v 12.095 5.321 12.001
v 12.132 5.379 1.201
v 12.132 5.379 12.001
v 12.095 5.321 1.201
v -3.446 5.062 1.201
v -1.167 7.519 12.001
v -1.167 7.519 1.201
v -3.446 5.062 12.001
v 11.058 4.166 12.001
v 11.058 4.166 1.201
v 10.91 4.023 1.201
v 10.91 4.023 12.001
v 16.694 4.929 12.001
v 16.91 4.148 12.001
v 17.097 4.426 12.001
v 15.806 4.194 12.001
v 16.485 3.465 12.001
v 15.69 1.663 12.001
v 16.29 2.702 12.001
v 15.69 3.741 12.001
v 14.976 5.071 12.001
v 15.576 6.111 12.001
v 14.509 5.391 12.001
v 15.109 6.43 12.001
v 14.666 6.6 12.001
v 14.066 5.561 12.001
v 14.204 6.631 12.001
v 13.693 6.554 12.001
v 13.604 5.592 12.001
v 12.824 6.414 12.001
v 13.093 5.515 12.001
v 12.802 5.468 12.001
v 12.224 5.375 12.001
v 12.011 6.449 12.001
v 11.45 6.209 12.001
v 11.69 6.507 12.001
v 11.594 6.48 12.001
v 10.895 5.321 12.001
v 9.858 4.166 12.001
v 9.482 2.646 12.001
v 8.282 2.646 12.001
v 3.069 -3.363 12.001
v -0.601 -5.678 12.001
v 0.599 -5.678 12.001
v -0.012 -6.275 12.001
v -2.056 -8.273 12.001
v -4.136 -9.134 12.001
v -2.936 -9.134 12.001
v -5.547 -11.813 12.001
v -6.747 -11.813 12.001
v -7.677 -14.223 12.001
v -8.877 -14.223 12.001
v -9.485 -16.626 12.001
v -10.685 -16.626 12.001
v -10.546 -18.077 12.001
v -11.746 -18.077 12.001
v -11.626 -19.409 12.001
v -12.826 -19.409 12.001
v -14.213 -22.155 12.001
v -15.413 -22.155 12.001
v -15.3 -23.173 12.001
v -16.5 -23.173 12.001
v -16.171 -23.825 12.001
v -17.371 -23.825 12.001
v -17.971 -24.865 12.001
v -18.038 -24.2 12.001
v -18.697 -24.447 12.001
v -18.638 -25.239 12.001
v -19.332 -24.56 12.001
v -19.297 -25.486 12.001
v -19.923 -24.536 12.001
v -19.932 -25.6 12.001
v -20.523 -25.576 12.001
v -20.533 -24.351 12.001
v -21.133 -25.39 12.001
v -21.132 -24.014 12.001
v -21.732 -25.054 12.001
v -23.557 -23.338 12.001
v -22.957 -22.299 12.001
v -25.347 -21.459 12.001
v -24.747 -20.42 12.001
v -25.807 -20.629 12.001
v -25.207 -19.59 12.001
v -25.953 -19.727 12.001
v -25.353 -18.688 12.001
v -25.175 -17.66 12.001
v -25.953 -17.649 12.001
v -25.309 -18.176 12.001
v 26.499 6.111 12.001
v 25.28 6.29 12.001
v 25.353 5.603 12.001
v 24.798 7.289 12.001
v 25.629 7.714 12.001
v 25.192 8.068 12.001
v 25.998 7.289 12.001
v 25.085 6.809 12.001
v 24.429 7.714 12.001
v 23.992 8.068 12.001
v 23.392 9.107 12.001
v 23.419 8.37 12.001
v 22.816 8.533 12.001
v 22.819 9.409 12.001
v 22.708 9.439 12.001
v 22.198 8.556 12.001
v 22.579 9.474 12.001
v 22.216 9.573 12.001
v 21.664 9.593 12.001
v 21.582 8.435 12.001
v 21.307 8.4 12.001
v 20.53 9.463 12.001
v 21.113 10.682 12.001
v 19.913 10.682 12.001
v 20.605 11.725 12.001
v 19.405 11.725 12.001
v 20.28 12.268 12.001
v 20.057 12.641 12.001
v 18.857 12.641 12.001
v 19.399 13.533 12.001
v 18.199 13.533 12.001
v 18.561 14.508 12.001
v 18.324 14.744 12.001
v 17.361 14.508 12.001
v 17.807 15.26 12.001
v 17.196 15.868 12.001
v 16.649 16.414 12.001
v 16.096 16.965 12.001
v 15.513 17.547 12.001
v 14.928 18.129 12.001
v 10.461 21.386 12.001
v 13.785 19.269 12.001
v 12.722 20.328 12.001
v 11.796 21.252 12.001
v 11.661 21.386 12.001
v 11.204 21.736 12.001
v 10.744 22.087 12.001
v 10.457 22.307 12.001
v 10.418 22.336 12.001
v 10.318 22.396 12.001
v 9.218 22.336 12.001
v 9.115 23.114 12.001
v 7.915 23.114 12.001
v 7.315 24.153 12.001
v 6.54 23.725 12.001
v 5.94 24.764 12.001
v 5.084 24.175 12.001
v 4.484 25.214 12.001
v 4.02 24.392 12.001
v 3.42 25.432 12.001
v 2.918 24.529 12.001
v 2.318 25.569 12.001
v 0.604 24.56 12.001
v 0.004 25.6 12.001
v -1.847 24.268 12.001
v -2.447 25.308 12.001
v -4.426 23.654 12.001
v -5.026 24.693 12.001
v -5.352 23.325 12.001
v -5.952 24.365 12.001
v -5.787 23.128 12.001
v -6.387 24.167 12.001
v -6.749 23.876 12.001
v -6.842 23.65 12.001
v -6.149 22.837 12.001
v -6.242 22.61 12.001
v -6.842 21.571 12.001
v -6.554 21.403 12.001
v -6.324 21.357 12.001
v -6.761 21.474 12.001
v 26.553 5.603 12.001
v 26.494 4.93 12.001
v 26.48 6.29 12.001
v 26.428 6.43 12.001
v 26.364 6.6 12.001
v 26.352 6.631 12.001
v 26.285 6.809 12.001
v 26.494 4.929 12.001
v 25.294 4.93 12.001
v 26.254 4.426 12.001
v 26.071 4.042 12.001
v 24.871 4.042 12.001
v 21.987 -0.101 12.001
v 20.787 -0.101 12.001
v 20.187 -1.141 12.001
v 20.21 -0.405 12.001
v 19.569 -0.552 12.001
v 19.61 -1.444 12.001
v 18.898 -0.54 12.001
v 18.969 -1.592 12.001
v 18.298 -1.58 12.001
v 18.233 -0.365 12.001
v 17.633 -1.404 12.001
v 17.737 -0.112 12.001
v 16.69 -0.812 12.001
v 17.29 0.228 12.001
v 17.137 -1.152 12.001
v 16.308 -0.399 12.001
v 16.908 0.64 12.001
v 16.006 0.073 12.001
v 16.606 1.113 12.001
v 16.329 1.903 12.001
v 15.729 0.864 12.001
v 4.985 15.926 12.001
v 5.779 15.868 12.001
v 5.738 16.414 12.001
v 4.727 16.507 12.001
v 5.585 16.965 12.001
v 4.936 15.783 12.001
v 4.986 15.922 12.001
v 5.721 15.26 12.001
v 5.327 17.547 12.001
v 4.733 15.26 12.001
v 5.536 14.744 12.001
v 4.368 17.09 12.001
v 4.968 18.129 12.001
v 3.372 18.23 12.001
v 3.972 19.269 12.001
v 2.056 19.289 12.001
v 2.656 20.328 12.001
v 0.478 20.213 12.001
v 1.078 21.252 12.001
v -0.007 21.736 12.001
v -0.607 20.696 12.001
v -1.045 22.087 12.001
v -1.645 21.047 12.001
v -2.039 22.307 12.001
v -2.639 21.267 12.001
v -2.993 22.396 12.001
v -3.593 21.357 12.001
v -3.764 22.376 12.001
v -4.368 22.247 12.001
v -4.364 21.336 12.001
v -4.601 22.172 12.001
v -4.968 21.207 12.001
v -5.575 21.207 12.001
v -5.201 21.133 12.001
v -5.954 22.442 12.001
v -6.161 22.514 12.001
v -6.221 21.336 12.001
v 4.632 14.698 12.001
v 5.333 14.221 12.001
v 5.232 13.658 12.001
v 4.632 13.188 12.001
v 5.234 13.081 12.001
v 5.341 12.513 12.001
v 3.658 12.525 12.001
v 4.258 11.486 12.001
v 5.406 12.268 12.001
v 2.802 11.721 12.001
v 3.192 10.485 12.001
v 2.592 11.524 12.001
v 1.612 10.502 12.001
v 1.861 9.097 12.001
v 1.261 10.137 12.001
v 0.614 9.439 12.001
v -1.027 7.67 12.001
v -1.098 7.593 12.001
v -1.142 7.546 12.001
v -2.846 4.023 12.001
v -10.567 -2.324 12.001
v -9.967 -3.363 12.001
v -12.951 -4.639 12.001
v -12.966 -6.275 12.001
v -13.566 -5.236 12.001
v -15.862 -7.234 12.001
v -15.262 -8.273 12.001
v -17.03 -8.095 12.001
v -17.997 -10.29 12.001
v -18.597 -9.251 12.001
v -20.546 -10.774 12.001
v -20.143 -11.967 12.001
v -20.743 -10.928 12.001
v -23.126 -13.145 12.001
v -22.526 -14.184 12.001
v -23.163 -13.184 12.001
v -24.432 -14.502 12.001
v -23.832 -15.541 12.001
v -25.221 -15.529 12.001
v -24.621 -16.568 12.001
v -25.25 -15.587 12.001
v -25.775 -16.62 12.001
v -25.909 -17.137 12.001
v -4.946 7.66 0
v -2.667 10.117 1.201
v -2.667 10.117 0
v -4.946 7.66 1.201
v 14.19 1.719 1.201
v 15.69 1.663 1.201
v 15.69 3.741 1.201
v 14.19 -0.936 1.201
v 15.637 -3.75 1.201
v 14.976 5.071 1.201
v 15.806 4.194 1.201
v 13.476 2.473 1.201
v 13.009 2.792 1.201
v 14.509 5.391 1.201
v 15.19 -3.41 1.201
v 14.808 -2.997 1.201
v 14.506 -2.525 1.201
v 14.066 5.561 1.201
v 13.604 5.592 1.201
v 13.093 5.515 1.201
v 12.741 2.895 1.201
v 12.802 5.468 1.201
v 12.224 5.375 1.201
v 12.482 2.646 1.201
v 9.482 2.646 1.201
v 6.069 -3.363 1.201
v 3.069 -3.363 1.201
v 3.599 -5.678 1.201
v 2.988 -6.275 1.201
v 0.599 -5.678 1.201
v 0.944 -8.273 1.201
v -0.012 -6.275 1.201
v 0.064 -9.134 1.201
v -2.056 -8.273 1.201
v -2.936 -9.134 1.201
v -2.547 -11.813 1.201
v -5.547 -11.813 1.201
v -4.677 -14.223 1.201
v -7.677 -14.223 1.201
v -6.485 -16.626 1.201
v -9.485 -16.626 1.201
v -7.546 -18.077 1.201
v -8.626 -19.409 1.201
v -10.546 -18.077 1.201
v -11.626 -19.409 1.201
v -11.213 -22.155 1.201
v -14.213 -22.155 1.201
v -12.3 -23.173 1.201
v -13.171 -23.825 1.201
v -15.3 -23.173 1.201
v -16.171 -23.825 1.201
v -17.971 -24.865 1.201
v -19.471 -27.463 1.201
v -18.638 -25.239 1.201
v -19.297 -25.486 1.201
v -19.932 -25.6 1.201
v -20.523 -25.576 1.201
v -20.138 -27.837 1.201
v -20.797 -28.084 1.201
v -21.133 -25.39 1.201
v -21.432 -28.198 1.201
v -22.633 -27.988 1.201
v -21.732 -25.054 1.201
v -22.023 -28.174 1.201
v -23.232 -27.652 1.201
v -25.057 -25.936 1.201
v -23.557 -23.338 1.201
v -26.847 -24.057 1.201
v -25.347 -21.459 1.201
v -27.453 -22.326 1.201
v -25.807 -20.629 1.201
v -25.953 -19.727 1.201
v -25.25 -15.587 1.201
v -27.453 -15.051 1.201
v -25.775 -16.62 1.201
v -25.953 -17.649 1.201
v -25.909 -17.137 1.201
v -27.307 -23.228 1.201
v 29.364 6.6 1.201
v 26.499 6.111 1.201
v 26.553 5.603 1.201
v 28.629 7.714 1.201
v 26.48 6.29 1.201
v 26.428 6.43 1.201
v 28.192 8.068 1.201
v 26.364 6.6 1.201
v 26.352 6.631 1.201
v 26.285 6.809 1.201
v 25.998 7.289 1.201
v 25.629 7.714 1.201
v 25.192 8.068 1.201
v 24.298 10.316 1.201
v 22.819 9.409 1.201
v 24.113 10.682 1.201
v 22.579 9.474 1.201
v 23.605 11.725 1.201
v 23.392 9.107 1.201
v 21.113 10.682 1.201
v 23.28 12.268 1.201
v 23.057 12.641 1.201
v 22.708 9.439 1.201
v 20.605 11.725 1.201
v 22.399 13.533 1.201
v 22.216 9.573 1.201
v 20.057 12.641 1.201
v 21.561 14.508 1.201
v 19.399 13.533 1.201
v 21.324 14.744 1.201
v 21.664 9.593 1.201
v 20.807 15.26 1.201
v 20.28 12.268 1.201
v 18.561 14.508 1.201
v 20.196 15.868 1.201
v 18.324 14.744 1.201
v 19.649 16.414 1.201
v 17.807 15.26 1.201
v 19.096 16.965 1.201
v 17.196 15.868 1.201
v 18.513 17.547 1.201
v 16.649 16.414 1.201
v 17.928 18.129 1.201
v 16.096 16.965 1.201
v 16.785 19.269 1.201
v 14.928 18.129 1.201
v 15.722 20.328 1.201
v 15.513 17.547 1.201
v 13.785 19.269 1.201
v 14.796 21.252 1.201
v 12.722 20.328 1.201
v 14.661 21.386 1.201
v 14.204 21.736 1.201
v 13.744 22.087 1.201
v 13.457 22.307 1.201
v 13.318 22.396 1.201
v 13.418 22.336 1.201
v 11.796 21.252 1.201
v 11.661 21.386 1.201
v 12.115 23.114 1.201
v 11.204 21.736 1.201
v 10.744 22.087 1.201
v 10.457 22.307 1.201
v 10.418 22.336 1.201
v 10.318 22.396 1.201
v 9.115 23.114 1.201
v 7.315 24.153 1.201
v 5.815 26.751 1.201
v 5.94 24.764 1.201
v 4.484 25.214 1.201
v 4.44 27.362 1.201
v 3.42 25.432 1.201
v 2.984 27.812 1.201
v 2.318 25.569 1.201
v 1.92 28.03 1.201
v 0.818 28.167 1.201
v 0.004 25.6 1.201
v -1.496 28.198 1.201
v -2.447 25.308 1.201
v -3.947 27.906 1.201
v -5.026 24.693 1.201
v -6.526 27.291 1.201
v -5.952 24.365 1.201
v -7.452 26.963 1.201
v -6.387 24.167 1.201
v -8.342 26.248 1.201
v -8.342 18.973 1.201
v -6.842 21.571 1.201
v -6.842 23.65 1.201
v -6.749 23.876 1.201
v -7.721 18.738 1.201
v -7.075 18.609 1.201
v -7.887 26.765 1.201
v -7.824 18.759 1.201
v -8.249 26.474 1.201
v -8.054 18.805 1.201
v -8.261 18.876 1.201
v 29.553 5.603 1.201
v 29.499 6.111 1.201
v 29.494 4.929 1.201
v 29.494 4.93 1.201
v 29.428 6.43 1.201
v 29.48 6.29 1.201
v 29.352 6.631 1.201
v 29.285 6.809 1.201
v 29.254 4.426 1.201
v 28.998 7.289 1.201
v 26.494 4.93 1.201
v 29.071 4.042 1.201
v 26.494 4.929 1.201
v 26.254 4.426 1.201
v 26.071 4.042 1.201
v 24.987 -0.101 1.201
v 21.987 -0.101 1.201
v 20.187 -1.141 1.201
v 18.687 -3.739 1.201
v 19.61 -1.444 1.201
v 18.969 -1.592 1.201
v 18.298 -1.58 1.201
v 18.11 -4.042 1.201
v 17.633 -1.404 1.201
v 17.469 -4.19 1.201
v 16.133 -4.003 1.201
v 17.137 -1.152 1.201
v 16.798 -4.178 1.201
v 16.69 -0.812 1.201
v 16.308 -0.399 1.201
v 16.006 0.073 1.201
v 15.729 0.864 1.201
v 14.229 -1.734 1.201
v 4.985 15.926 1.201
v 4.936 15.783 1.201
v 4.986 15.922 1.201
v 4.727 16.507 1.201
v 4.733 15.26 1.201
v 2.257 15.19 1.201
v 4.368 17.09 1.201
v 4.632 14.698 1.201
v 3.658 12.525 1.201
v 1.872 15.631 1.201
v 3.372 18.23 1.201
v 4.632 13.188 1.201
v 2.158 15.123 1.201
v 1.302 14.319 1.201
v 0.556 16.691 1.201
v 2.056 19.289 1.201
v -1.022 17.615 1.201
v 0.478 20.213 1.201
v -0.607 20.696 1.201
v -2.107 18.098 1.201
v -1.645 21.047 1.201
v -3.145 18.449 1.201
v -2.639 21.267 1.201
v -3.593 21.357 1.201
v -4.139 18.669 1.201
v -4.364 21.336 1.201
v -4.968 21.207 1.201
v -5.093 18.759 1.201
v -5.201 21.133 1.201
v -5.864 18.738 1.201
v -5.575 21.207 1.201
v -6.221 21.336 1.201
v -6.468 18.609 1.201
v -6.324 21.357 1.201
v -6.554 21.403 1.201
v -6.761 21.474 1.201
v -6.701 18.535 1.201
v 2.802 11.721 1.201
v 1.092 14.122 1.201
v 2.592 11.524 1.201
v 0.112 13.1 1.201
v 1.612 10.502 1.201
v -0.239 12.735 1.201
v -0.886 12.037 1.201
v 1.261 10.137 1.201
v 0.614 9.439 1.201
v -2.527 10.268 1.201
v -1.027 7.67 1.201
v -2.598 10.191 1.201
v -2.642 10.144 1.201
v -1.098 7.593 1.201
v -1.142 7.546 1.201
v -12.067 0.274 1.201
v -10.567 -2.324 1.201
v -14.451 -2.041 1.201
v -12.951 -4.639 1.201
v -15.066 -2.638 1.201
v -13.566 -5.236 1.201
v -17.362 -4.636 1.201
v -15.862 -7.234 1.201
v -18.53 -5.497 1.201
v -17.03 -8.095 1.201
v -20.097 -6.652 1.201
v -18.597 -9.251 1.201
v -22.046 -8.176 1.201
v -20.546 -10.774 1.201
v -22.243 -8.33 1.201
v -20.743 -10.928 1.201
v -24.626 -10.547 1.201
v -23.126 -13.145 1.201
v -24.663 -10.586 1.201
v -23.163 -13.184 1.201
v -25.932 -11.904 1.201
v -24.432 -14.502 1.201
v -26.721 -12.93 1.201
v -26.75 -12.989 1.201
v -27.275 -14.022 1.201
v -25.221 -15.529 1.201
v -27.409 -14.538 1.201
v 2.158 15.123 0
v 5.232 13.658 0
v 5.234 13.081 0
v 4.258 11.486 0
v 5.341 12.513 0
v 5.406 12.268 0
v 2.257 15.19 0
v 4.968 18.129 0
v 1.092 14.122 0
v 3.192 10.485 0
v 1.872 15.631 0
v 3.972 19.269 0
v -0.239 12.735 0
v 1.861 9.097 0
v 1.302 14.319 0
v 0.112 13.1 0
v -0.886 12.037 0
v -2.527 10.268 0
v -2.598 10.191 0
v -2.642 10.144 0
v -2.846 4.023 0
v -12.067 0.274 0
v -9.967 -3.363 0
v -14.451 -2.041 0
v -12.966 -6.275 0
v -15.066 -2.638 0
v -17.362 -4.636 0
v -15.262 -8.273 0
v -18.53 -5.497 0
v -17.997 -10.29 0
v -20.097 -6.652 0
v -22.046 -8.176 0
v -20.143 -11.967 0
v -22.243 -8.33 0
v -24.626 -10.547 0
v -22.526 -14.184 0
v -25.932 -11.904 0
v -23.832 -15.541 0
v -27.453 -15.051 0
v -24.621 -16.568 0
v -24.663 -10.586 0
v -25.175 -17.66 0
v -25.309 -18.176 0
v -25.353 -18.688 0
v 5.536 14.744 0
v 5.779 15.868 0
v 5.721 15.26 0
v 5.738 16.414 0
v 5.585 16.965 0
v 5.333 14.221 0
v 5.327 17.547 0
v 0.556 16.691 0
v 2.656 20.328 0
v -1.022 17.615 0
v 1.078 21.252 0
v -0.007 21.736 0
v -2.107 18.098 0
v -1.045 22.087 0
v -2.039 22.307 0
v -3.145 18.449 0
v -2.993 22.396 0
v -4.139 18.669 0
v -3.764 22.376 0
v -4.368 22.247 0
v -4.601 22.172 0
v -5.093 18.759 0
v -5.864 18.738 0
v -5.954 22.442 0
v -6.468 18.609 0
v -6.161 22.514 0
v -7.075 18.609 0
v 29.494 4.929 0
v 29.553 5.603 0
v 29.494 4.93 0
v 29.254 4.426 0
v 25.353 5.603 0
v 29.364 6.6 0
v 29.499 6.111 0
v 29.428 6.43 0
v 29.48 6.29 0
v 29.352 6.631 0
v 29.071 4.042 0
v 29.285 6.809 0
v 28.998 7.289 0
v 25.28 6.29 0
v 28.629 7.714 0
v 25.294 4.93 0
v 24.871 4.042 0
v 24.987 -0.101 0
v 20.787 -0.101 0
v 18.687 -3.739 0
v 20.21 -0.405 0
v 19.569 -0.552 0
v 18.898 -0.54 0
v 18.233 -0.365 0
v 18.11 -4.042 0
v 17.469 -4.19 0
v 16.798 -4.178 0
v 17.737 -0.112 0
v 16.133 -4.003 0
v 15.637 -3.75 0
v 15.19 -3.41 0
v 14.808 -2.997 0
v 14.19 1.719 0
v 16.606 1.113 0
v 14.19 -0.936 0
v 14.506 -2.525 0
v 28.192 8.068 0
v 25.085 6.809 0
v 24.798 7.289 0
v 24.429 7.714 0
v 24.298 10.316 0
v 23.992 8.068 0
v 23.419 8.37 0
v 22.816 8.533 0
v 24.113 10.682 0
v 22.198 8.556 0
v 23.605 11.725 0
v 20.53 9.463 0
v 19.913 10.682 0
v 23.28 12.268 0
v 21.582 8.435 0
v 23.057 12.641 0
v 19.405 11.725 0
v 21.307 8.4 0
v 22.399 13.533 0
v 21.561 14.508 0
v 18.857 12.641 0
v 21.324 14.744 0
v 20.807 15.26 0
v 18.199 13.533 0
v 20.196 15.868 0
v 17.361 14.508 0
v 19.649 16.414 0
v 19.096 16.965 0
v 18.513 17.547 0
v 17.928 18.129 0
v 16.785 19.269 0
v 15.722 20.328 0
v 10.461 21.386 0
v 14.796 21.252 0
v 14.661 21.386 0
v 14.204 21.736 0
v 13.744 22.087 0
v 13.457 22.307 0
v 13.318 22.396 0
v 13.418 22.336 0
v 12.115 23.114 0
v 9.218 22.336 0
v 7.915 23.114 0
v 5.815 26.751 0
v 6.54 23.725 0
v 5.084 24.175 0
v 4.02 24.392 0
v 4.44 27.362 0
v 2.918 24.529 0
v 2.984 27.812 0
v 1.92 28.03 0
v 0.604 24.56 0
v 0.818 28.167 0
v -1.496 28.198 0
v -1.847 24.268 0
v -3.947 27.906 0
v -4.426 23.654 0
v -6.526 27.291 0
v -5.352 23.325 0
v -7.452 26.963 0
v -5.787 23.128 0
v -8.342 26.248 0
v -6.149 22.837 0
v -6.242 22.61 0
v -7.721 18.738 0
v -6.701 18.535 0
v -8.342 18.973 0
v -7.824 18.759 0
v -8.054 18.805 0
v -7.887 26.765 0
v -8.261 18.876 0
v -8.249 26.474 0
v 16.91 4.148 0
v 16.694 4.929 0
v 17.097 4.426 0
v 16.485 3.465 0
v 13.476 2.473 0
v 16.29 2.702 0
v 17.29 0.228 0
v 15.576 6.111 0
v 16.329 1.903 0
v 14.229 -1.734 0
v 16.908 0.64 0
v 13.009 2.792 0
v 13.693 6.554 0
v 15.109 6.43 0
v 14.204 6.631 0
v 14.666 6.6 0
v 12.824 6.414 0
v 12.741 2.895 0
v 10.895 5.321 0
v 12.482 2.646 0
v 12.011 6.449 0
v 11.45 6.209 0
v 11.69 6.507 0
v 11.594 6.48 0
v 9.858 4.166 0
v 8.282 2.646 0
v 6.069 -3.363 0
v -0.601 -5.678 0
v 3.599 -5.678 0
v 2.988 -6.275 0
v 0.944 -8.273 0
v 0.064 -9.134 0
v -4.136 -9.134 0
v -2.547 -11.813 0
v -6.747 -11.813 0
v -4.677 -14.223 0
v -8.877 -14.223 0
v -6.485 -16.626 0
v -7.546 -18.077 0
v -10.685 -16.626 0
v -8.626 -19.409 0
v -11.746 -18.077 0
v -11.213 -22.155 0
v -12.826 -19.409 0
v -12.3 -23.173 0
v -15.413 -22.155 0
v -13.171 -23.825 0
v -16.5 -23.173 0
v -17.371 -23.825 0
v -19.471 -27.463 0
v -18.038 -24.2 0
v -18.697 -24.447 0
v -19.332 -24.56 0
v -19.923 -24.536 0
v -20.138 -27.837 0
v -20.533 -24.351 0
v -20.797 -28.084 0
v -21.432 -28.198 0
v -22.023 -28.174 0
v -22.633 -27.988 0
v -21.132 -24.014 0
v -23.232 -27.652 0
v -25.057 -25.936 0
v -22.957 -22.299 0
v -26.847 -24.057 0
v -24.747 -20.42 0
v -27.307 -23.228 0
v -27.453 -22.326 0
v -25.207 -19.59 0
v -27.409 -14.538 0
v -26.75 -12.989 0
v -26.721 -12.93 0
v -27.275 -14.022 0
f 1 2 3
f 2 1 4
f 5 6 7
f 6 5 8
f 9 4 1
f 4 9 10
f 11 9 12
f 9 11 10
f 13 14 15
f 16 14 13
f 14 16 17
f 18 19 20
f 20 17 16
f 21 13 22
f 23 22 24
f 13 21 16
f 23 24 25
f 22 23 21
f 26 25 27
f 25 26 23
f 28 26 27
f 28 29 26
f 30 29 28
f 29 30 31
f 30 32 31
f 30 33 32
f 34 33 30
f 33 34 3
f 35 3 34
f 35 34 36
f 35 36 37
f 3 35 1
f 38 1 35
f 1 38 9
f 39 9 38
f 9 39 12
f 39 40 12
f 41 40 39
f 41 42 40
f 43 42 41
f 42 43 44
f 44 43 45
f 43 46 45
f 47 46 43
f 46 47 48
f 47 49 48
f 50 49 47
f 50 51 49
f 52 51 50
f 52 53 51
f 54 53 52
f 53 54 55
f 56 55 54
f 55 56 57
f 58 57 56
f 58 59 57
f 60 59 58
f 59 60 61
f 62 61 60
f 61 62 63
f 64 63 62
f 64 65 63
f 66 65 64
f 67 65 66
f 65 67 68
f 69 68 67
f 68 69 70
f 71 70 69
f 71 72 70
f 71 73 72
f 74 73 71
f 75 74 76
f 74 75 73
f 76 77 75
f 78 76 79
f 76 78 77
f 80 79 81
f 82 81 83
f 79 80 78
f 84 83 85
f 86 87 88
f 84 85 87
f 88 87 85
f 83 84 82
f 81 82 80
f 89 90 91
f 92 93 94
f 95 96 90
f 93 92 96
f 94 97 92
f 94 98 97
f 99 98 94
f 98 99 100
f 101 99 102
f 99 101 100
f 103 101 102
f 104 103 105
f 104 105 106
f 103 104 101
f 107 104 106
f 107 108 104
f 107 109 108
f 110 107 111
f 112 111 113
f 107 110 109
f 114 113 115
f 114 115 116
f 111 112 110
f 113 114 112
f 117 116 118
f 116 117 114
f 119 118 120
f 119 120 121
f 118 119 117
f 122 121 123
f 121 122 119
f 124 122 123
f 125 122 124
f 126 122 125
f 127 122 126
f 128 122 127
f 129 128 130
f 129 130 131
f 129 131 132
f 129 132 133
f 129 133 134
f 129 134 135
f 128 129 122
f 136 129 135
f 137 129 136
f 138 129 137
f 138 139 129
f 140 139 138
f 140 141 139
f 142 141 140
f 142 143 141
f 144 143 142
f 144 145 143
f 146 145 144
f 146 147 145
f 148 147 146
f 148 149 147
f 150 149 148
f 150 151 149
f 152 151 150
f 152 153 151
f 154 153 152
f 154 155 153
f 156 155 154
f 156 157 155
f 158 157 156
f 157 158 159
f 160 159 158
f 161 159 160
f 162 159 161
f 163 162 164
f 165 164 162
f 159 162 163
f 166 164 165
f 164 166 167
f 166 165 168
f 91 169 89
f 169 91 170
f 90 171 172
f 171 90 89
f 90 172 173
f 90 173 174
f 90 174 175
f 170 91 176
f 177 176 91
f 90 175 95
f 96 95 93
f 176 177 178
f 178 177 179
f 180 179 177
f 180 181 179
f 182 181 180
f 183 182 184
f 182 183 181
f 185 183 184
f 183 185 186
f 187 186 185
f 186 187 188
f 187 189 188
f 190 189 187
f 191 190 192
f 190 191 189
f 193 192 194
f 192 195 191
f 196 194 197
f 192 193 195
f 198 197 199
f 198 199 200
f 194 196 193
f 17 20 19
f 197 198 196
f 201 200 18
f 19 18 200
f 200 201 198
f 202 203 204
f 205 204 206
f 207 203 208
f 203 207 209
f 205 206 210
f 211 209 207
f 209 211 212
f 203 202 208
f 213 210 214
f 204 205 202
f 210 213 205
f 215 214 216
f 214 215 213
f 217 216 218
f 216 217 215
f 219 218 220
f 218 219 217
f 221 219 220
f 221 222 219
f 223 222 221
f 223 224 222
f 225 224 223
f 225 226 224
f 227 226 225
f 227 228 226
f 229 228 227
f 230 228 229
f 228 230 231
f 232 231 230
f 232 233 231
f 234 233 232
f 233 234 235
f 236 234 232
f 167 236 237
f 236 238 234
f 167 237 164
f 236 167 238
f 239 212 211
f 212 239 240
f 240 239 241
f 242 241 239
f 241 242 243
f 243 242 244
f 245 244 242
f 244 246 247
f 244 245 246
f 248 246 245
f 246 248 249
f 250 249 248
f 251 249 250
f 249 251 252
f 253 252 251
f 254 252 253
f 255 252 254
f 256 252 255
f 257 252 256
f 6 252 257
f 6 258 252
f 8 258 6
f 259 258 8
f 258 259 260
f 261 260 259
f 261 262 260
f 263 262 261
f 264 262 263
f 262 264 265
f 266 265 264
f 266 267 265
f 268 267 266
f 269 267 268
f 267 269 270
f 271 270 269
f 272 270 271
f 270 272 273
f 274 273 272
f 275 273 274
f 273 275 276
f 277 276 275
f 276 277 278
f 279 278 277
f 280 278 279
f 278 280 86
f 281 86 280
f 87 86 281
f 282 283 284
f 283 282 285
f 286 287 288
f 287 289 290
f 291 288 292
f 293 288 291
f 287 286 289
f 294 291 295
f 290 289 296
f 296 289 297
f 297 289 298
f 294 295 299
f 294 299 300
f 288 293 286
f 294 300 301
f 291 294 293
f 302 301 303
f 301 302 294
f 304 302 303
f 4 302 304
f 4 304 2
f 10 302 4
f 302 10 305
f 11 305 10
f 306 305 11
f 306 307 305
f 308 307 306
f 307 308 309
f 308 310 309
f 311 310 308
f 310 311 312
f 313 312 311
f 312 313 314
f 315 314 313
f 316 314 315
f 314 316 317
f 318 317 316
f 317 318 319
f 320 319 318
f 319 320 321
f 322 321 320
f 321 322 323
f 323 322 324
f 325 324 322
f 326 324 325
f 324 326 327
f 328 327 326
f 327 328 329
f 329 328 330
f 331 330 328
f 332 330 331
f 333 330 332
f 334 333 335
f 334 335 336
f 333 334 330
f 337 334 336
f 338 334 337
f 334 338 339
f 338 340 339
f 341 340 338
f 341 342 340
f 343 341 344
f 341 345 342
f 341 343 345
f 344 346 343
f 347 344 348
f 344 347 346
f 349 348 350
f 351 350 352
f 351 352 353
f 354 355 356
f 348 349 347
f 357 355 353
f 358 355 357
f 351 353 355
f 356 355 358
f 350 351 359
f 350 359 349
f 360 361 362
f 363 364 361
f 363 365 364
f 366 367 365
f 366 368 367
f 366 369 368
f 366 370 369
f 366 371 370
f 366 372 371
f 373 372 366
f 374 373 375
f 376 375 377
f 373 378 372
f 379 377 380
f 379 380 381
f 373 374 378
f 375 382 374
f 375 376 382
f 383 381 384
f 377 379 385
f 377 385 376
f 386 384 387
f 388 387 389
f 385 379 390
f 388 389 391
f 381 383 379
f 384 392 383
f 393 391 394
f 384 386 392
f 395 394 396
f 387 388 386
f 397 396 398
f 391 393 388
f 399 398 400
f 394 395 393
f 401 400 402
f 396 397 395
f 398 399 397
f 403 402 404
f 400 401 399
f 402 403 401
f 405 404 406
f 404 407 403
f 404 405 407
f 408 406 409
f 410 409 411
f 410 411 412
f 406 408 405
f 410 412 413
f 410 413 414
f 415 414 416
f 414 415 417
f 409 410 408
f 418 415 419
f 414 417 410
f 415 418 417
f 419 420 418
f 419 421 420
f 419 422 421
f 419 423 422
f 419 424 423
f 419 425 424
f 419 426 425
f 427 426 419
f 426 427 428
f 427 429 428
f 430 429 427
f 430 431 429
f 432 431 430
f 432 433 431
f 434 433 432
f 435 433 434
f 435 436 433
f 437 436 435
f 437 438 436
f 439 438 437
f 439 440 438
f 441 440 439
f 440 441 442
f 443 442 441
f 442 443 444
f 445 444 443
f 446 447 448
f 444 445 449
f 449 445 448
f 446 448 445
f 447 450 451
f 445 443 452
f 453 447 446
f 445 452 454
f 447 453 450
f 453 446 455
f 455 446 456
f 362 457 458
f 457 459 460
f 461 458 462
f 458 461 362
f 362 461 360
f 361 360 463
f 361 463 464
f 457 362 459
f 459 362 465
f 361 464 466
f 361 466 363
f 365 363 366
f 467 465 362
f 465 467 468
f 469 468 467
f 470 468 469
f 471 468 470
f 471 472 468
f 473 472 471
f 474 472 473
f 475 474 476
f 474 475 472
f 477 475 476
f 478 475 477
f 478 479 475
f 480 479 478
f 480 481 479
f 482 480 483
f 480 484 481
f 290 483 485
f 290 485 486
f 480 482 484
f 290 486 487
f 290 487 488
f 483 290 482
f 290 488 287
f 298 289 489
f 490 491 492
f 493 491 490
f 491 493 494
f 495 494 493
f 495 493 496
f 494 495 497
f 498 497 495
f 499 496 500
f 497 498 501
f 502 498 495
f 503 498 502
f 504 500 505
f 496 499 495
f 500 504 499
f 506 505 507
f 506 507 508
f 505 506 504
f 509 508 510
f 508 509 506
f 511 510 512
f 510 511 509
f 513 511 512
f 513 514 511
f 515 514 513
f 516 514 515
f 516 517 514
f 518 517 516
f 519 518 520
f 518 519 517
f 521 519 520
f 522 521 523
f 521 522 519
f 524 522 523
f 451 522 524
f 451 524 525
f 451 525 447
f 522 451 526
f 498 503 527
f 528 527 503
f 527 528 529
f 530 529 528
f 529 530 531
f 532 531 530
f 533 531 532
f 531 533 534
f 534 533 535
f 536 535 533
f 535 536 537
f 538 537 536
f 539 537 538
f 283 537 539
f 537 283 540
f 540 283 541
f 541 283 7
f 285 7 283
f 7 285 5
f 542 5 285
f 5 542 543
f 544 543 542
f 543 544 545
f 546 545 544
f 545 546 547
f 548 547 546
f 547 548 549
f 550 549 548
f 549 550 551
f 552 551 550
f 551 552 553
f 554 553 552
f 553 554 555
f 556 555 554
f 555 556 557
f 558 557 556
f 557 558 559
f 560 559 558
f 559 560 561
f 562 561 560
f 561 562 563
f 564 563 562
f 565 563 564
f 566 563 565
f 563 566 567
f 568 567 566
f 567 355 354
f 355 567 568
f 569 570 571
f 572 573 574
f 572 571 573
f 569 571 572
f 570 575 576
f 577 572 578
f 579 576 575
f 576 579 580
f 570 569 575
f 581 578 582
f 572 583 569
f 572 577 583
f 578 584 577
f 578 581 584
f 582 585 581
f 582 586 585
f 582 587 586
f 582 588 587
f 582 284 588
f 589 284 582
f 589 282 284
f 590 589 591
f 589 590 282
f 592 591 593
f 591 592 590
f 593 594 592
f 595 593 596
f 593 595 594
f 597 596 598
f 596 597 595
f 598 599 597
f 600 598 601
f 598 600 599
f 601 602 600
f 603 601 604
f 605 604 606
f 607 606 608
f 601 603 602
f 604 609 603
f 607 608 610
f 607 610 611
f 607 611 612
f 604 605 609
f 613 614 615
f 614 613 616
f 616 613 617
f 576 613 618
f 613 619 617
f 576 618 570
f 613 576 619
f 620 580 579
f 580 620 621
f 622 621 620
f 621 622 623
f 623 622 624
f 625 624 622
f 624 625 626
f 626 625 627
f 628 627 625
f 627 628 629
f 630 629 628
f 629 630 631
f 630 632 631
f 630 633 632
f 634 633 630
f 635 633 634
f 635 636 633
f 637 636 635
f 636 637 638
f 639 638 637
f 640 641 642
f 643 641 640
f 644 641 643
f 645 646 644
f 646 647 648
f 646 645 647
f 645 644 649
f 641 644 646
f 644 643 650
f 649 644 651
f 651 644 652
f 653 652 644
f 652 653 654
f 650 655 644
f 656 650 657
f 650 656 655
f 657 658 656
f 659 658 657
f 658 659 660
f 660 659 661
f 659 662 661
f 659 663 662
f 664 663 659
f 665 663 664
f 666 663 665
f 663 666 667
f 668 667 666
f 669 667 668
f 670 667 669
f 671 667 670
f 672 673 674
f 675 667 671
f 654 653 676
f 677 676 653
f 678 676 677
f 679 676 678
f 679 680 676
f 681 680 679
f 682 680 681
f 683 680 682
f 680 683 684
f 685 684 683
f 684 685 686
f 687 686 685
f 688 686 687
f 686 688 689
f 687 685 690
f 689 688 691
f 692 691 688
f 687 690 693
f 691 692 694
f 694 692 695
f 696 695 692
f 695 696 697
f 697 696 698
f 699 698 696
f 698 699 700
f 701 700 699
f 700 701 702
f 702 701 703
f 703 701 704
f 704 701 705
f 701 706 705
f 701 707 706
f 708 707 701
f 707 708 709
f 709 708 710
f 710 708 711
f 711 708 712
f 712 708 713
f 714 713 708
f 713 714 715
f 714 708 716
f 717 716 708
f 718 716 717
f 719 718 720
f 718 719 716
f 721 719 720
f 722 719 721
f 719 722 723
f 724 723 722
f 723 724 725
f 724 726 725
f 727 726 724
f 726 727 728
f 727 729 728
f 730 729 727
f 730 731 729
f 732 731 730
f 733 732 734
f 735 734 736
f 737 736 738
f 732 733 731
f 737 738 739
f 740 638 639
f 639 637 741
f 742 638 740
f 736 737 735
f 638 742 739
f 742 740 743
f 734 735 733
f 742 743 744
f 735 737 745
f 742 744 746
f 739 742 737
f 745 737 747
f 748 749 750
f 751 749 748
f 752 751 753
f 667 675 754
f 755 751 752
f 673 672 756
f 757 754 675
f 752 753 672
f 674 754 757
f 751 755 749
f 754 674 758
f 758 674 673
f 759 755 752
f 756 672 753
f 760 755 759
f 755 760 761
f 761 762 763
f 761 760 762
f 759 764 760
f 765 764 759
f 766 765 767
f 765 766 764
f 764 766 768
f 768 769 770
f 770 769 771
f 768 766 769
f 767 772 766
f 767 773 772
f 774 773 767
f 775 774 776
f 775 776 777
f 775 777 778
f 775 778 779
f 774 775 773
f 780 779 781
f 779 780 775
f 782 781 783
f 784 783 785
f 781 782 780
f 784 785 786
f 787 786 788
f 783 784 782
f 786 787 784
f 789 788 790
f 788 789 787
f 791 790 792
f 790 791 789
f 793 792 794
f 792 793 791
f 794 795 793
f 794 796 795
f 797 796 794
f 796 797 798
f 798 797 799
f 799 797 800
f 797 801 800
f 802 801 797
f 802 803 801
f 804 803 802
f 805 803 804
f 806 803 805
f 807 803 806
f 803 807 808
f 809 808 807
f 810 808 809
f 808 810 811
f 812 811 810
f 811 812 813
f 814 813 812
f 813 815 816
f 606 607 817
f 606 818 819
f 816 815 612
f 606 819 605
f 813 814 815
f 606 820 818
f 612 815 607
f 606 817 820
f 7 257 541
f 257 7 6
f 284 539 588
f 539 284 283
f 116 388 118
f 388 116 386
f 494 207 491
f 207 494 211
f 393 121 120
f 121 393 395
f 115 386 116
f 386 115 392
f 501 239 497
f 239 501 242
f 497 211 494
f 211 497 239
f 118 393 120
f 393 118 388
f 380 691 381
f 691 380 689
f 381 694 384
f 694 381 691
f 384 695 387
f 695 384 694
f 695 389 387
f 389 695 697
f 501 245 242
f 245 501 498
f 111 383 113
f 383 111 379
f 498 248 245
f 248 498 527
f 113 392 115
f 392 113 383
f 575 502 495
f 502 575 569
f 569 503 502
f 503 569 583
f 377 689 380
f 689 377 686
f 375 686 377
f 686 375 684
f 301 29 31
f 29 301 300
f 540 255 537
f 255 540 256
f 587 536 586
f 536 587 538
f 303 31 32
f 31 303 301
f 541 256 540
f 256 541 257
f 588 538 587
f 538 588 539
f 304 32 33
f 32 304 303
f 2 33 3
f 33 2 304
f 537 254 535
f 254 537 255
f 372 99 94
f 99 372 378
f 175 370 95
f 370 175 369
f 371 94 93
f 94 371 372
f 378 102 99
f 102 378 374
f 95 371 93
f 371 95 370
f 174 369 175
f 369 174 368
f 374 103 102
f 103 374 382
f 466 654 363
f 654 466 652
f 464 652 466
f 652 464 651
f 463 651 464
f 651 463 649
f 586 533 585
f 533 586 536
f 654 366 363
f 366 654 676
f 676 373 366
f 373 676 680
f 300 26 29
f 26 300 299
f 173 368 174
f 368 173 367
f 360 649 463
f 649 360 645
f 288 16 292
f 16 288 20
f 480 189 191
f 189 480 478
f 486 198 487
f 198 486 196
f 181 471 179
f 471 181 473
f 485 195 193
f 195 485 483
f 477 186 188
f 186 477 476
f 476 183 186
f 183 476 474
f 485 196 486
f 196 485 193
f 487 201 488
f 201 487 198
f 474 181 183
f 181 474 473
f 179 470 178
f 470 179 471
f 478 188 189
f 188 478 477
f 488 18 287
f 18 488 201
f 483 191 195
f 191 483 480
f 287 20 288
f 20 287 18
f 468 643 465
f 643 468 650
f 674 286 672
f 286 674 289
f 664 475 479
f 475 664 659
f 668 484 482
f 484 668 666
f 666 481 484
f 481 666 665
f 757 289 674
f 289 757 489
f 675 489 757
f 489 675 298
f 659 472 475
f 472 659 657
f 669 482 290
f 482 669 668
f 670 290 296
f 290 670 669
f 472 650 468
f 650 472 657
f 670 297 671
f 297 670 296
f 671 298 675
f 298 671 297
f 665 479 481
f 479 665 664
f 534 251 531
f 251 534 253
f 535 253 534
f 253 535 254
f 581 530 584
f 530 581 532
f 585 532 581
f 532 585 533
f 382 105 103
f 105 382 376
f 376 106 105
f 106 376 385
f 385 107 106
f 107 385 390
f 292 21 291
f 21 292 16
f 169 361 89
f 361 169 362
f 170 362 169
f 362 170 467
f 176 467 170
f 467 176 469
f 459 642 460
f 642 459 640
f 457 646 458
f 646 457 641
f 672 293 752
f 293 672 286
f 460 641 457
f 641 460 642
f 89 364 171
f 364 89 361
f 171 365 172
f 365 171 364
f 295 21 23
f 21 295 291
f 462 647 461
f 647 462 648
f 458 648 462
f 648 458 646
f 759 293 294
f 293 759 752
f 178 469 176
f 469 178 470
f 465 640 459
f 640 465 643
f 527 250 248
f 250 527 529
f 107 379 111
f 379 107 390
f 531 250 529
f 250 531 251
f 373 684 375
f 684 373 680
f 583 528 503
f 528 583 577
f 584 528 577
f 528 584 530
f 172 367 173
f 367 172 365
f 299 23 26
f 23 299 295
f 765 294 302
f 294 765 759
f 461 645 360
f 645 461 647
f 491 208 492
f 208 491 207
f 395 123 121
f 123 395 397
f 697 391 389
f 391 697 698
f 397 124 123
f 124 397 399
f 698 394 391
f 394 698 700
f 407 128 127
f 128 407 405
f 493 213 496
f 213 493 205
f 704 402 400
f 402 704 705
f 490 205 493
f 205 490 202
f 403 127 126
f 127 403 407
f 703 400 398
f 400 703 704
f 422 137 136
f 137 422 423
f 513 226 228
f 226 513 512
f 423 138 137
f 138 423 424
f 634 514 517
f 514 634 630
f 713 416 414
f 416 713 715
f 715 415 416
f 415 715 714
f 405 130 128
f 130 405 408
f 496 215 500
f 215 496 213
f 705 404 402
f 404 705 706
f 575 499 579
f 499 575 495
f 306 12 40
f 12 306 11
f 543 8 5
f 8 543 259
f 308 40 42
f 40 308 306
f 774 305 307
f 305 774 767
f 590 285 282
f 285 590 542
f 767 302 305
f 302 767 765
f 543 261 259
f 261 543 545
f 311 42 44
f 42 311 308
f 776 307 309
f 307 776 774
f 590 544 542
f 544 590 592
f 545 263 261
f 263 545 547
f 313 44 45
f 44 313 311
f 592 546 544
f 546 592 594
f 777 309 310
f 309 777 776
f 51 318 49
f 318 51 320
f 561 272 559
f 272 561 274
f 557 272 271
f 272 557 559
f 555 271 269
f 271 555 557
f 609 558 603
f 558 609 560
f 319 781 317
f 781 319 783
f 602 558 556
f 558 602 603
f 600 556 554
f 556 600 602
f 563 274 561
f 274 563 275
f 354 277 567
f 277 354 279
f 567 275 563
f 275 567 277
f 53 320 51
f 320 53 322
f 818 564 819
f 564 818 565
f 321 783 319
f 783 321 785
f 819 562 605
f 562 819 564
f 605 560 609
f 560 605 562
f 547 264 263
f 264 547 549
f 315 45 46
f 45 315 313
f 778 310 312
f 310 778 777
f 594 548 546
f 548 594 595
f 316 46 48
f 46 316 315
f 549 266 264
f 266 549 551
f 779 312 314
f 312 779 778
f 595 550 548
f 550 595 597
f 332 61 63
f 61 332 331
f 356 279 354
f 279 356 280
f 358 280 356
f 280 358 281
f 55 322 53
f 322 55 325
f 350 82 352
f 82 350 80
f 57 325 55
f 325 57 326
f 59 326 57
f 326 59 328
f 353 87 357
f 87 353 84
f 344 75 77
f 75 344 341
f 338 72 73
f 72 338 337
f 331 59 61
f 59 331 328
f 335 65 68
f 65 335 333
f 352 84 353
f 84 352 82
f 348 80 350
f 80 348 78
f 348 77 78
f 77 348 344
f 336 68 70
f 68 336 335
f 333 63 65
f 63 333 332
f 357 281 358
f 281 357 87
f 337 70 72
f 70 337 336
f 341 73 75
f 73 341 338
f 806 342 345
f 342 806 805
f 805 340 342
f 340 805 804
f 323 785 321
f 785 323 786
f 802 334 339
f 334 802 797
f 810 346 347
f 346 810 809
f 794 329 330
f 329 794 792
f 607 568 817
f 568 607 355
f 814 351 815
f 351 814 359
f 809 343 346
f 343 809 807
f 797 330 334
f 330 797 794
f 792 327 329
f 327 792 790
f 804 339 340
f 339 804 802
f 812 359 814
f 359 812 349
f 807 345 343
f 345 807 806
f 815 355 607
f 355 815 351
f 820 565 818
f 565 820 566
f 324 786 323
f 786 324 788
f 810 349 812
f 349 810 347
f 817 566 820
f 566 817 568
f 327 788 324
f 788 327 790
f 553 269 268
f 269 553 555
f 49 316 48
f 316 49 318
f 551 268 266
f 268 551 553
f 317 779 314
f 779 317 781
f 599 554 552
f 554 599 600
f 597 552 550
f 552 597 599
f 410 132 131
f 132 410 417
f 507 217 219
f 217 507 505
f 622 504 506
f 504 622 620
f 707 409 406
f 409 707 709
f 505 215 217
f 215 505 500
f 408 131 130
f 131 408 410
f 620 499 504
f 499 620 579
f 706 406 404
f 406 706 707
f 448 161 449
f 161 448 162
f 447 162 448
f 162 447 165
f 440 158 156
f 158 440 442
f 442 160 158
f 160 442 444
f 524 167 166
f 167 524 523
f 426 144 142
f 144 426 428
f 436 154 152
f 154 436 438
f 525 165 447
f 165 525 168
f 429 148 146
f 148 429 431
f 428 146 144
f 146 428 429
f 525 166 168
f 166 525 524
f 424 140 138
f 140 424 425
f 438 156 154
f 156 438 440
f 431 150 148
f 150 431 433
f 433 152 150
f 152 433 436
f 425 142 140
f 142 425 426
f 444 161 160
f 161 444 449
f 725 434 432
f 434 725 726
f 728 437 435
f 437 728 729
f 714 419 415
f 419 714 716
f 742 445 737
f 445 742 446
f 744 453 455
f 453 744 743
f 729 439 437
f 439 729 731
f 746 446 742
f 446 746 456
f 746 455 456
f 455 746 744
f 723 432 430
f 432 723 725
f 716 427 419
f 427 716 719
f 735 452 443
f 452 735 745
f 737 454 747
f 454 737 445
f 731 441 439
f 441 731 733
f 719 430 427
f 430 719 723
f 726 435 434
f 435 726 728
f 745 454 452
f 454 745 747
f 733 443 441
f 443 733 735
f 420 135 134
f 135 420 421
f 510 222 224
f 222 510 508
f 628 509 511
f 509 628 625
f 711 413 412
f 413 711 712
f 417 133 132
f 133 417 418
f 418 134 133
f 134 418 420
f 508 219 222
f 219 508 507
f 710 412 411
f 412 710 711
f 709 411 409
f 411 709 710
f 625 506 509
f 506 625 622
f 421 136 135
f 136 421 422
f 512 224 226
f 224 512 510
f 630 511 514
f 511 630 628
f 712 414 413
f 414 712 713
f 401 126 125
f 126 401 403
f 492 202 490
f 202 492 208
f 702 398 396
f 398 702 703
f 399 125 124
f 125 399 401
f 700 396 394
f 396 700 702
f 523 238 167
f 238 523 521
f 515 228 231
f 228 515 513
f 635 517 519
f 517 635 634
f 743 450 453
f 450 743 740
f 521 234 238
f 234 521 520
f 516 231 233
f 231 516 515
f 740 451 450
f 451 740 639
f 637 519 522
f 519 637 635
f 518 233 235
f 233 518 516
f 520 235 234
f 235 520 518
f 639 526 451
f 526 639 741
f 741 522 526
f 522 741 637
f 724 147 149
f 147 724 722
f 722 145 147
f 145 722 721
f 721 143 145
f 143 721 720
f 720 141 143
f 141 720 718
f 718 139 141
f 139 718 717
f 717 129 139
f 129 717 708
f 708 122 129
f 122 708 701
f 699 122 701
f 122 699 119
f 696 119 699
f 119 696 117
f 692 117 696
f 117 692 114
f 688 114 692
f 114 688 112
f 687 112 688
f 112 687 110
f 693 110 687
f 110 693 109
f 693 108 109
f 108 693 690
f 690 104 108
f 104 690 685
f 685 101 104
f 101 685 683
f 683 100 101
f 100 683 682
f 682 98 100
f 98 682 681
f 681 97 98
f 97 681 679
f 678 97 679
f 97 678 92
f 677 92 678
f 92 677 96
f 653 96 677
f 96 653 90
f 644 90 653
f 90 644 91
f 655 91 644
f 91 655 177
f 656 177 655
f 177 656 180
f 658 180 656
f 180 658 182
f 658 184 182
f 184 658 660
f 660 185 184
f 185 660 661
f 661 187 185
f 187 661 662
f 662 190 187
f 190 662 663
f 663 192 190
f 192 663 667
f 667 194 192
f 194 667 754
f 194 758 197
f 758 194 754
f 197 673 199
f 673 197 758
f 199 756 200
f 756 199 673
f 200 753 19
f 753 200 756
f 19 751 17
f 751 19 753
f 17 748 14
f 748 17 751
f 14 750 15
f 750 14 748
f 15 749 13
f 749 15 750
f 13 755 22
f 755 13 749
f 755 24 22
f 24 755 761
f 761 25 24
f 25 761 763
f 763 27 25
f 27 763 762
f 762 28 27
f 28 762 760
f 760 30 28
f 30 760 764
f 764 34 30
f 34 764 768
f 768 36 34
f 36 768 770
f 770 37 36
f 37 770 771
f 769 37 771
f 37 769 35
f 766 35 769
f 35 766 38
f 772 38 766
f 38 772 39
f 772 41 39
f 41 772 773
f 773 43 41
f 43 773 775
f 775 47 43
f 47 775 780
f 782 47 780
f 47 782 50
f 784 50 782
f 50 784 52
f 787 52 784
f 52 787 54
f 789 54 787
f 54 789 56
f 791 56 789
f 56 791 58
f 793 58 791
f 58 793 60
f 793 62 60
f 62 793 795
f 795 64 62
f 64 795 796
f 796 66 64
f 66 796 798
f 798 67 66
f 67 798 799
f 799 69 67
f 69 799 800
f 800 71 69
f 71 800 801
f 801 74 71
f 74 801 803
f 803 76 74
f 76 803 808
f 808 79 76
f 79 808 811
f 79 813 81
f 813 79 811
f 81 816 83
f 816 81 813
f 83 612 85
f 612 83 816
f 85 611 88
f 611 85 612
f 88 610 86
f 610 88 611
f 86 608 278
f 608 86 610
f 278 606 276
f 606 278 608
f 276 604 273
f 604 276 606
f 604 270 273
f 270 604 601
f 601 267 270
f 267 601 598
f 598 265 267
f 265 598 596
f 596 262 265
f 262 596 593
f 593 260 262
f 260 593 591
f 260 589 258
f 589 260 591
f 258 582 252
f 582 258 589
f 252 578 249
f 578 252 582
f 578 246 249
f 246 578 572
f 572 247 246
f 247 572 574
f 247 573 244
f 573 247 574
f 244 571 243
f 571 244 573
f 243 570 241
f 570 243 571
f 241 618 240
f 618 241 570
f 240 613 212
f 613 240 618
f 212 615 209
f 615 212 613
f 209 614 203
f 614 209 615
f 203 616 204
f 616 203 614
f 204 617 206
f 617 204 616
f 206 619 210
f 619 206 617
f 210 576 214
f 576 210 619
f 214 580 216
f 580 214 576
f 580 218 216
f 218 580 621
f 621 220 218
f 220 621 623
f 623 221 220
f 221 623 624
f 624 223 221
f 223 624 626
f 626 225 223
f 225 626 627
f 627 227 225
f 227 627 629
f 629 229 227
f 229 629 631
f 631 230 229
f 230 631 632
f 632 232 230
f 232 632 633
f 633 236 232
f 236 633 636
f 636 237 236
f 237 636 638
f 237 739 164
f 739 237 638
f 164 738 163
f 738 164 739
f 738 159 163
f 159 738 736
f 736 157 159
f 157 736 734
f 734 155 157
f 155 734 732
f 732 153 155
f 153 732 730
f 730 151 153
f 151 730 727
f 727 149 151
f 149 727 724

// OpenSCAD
// Module names are of the form poly_<inkscape-path-id>().  As a result,
// you can associate a polygon in this OpenSCAD program with the corresponding
// SVG element in the Inkscape document by looking for the XML element with
// the attribute id="inkscape-path-id".

// fudge value is used to ensure that subtracted solids are a tad taller
// in the z dimension than the polygon being subtracted from.  This helps
// keep the resulting .stl file manifold.
fudge = 0.1;

			
			    /// Global parameters
grid = false ;   //Use grid for multi elements cutters
full= false ;  //For build full or empty objects (see instuctables for details)
borderThick = 1.20000004768  ;    //border thickness (mm)
h=   12.0  ;    //total height of the cookie cutter (mm)
borderType=  1   ;    //type of border, 0 none, 1-classic, 2-cone
Lreb = 3.0;     //Width of border (en mm)
Hreb = 1.20000004768 ;    //Thickness of border (mm)




                /// Grid parameters
gridX=300;      //Maximum X dimension Change only if you build cookies bigger than 30cm
gridY=300;      //Maximum Y dimension Change only if you build cookies bigger than 30cm
meshSolid=1.20000004768;    //width of solid part of grid
meshSpace=8.0;    //width of blank part of grid 
gridThickness=Hreb; //thickness of grid
moveGridX=0;    //X shift for adujustments
moveGridY=0;    //Y shift for adjustments
rotateGridZ=45.0;  //Z rotation for adjtments
$fn = 0.1;



module poly_path74(h)
{
  scale([25.4/90, -25.4/90, 1]) union()
  {
    linear_extrude(height=h)
      polygon([[-70.592150,86.940083],[-72.755407,86.281590],[-74.878200,85.090253],[-81.342534,79.012201],[-87.687790,72.352803],[-89.316400,69.414184],[-89.832940,66.218083],[-89.678120,64.402440],[-89.203848,62.573380],[-87.238090,58.704563],[-84.443448,55.066159],[-79.815160,50.258333],[-71.371364,42.402495],[-63.768820,36.459773],[-54.078977,29.315063],[-45.943236,22.234921],[-35.317114,11.917893],[-10.084296,-14.254247],[6.594403,-32.234867],[11.310618,-37.151239],[15.088073,-40.697427],[19.156653,-43.470707],[18.926413,-44.336267],[18.544739,-46.351005],[18.537161,-48.395928],[18.896430,-50.387803],[19.615293,-52.243397],[20.270189,-54.069572],[20.475483,-56.226294],[20.332848,-58.158322],[19.788063,-60.112596],[18.875774,-62.173270],[17.601871,-64.237054],[14.073063,-68.275184],[9.409325,-72.029447],[3.818343,-75.302300],[-0.026174,-77.015744],[-3.702164,-78.259943],[-7.223543,-79.038808],[-10.604230,-79.356250],[-13.336397,-79.283390],[-15.477266,-78.826470],[-16.304135,-78.562660],[-21.097239,-79.518600],[-21.828636,-79.772676],[-22.116725,-80.115661],[-21.789289,-80.918877],[-20.504183,-81.947911],[-18.963827,-82.648923],[-15.682327,-83.813270],[-6.545233,-85.990504],[2.139673,-87.024980],[10.338009,-86.914814],[14.243969,-86.429901],[18.015393,-85.658120],[23.173078,-84.064899],[28.043533,-81.899565],[32.663000,-79.143321],[37.067723,-75.777370],[61.513873,-51.407283],[64.483847,-47.952662],[66.815710,-44.789664],[68.757697,-41.546187],[70.558043,-37.850127],[72.743403,-33.530297],[75.497423,-29.763217],[76.470133,-29.887217],[78.655749,-30.315370],[80.843295,-30.236075],[82.979830,-29.657388],[85.012413,-28.587367],[86.561165,-27.333437],[87.866055,-25.826581],[88.885102,-24.124761],[89.576323,-22.285937],[89.832940,-19.854832],[89.625623,-17.466927],[88.127243,-14.322067],[73.654243,0.359593],[71.610751,1.434219],[69.337569,1.956873],[66.960716,1.914537],[64.606213,1.294193],[62.847563,0.397976],[61.264680,-0.806117],[59.911323,-2.269253],[58.841253,-3.942597],[57.857535,-6.742705],[57.719698,-9.573221],[58.411998,-12.277037],[59.918693,-14.697047],[60.579233,-15.681577],[59.152223,-17.463737],[55.188829,-21.651706],[53.536770,-22.782590],[51.964463,-23.386777],[50.328661,-23.495064],[48.519303,-23.222537],[45.441111,-22.727490],[42.560313,-22.850067],[41.420333,-23.056337],[41.079649,-22.960007],[40.571243,-22.000097],[38.604809,-18.852265],[34.928923,-14.760257],[29.346893,-9.375147],[-2.131301,20.119310],[-14.655928,32.366116],[-23.905989,41.857313],[-31.454216,50.396636],[-37.858598,58.911833],[-41.620064,64.051322],[-45.447495,68.773696],[-54.613945,78.503133],[-58.464026,82.108756],[-61.550940,84.420773],[-63.913625,85.747519],[-66.250667,86.621524],[-68.498160,87.024980],[-70.592200,86.940083]]);
  }
}


module shape(h){ poly_path74(h);

}

//-------------------------------------------------

/// Module grid have been imported from the Openscad grid creator by Glyn
/// Orininaly published on http://www.thingiverse.com/thing:29211
/// Under the terms of Creative Commons By-Sa (08.26.2012)

module grid(meshSolid, meshSpace, gridThickness, gridX, gridY){

meshX=gridX;
meshY=gridY;
nX=meshX/(meshSolid+meshSpace);
nY=meshY/(meshSolid+meshSpace);

for (i=[0:nX]) {
	 	 translate([-(meshX/2)+i*(meshSolid+meshSpace),-meshY/2,-gridThickness/2]) cube(size=[meshSolid,meshY,gridThickness],center=false);
}

for (i=[0:nY]) {
	 	translate([-meshX/2,-(meshY/2)+i*(meshSolid+meshSpace),-gridThickness/2]) cube(size=[meshX,meshSolid,gridThickness],center=false);
    }
}


module rebords(borderType,borderThick,Lreb,Hreb){
if (borderType==0){}
if (borderType==1){
    cylinder(h = Hreb, r=(borderThick+Lreb));} 
if (borderType==2) {
    cylinder(h = Hreb, r1=(borderThick+Lreb),r2=(borderThick));}
}


module borders(h){
cylinder(r=borderThick,h=h);
}



module fullVolume (borderType,borderThick,Lreb,Hreb,h) {
minkowski(){
    shape(0.001);
    union(){
       borders(h);
       rebords(borderType,borderThick,Lreb,Hreb);
    }}}


module finalShape(){
if (full == false){
    difference(){
      fullVolume(borderType,borderThick,Lreb,Hreb,h);
      translate([0,0,(-0.5*h)]) shape(3*h);
}}
else{
          fullVolume(borderType,borderThick,Lreb,Hreb,h);
}
}


if (grid==true){
union (){
  finalShape();
  intersection() {
   translate([moveGridX,moveGridY,(0.5*gridThickness)]) rotate([0,0,rotateGridZ]) grid(meshSolid, meshSpace, gridThickness, gridX, gridY);
    shape();
}}
}
else{
    finalShape();
}

// Enjoy your cookies ! :)
